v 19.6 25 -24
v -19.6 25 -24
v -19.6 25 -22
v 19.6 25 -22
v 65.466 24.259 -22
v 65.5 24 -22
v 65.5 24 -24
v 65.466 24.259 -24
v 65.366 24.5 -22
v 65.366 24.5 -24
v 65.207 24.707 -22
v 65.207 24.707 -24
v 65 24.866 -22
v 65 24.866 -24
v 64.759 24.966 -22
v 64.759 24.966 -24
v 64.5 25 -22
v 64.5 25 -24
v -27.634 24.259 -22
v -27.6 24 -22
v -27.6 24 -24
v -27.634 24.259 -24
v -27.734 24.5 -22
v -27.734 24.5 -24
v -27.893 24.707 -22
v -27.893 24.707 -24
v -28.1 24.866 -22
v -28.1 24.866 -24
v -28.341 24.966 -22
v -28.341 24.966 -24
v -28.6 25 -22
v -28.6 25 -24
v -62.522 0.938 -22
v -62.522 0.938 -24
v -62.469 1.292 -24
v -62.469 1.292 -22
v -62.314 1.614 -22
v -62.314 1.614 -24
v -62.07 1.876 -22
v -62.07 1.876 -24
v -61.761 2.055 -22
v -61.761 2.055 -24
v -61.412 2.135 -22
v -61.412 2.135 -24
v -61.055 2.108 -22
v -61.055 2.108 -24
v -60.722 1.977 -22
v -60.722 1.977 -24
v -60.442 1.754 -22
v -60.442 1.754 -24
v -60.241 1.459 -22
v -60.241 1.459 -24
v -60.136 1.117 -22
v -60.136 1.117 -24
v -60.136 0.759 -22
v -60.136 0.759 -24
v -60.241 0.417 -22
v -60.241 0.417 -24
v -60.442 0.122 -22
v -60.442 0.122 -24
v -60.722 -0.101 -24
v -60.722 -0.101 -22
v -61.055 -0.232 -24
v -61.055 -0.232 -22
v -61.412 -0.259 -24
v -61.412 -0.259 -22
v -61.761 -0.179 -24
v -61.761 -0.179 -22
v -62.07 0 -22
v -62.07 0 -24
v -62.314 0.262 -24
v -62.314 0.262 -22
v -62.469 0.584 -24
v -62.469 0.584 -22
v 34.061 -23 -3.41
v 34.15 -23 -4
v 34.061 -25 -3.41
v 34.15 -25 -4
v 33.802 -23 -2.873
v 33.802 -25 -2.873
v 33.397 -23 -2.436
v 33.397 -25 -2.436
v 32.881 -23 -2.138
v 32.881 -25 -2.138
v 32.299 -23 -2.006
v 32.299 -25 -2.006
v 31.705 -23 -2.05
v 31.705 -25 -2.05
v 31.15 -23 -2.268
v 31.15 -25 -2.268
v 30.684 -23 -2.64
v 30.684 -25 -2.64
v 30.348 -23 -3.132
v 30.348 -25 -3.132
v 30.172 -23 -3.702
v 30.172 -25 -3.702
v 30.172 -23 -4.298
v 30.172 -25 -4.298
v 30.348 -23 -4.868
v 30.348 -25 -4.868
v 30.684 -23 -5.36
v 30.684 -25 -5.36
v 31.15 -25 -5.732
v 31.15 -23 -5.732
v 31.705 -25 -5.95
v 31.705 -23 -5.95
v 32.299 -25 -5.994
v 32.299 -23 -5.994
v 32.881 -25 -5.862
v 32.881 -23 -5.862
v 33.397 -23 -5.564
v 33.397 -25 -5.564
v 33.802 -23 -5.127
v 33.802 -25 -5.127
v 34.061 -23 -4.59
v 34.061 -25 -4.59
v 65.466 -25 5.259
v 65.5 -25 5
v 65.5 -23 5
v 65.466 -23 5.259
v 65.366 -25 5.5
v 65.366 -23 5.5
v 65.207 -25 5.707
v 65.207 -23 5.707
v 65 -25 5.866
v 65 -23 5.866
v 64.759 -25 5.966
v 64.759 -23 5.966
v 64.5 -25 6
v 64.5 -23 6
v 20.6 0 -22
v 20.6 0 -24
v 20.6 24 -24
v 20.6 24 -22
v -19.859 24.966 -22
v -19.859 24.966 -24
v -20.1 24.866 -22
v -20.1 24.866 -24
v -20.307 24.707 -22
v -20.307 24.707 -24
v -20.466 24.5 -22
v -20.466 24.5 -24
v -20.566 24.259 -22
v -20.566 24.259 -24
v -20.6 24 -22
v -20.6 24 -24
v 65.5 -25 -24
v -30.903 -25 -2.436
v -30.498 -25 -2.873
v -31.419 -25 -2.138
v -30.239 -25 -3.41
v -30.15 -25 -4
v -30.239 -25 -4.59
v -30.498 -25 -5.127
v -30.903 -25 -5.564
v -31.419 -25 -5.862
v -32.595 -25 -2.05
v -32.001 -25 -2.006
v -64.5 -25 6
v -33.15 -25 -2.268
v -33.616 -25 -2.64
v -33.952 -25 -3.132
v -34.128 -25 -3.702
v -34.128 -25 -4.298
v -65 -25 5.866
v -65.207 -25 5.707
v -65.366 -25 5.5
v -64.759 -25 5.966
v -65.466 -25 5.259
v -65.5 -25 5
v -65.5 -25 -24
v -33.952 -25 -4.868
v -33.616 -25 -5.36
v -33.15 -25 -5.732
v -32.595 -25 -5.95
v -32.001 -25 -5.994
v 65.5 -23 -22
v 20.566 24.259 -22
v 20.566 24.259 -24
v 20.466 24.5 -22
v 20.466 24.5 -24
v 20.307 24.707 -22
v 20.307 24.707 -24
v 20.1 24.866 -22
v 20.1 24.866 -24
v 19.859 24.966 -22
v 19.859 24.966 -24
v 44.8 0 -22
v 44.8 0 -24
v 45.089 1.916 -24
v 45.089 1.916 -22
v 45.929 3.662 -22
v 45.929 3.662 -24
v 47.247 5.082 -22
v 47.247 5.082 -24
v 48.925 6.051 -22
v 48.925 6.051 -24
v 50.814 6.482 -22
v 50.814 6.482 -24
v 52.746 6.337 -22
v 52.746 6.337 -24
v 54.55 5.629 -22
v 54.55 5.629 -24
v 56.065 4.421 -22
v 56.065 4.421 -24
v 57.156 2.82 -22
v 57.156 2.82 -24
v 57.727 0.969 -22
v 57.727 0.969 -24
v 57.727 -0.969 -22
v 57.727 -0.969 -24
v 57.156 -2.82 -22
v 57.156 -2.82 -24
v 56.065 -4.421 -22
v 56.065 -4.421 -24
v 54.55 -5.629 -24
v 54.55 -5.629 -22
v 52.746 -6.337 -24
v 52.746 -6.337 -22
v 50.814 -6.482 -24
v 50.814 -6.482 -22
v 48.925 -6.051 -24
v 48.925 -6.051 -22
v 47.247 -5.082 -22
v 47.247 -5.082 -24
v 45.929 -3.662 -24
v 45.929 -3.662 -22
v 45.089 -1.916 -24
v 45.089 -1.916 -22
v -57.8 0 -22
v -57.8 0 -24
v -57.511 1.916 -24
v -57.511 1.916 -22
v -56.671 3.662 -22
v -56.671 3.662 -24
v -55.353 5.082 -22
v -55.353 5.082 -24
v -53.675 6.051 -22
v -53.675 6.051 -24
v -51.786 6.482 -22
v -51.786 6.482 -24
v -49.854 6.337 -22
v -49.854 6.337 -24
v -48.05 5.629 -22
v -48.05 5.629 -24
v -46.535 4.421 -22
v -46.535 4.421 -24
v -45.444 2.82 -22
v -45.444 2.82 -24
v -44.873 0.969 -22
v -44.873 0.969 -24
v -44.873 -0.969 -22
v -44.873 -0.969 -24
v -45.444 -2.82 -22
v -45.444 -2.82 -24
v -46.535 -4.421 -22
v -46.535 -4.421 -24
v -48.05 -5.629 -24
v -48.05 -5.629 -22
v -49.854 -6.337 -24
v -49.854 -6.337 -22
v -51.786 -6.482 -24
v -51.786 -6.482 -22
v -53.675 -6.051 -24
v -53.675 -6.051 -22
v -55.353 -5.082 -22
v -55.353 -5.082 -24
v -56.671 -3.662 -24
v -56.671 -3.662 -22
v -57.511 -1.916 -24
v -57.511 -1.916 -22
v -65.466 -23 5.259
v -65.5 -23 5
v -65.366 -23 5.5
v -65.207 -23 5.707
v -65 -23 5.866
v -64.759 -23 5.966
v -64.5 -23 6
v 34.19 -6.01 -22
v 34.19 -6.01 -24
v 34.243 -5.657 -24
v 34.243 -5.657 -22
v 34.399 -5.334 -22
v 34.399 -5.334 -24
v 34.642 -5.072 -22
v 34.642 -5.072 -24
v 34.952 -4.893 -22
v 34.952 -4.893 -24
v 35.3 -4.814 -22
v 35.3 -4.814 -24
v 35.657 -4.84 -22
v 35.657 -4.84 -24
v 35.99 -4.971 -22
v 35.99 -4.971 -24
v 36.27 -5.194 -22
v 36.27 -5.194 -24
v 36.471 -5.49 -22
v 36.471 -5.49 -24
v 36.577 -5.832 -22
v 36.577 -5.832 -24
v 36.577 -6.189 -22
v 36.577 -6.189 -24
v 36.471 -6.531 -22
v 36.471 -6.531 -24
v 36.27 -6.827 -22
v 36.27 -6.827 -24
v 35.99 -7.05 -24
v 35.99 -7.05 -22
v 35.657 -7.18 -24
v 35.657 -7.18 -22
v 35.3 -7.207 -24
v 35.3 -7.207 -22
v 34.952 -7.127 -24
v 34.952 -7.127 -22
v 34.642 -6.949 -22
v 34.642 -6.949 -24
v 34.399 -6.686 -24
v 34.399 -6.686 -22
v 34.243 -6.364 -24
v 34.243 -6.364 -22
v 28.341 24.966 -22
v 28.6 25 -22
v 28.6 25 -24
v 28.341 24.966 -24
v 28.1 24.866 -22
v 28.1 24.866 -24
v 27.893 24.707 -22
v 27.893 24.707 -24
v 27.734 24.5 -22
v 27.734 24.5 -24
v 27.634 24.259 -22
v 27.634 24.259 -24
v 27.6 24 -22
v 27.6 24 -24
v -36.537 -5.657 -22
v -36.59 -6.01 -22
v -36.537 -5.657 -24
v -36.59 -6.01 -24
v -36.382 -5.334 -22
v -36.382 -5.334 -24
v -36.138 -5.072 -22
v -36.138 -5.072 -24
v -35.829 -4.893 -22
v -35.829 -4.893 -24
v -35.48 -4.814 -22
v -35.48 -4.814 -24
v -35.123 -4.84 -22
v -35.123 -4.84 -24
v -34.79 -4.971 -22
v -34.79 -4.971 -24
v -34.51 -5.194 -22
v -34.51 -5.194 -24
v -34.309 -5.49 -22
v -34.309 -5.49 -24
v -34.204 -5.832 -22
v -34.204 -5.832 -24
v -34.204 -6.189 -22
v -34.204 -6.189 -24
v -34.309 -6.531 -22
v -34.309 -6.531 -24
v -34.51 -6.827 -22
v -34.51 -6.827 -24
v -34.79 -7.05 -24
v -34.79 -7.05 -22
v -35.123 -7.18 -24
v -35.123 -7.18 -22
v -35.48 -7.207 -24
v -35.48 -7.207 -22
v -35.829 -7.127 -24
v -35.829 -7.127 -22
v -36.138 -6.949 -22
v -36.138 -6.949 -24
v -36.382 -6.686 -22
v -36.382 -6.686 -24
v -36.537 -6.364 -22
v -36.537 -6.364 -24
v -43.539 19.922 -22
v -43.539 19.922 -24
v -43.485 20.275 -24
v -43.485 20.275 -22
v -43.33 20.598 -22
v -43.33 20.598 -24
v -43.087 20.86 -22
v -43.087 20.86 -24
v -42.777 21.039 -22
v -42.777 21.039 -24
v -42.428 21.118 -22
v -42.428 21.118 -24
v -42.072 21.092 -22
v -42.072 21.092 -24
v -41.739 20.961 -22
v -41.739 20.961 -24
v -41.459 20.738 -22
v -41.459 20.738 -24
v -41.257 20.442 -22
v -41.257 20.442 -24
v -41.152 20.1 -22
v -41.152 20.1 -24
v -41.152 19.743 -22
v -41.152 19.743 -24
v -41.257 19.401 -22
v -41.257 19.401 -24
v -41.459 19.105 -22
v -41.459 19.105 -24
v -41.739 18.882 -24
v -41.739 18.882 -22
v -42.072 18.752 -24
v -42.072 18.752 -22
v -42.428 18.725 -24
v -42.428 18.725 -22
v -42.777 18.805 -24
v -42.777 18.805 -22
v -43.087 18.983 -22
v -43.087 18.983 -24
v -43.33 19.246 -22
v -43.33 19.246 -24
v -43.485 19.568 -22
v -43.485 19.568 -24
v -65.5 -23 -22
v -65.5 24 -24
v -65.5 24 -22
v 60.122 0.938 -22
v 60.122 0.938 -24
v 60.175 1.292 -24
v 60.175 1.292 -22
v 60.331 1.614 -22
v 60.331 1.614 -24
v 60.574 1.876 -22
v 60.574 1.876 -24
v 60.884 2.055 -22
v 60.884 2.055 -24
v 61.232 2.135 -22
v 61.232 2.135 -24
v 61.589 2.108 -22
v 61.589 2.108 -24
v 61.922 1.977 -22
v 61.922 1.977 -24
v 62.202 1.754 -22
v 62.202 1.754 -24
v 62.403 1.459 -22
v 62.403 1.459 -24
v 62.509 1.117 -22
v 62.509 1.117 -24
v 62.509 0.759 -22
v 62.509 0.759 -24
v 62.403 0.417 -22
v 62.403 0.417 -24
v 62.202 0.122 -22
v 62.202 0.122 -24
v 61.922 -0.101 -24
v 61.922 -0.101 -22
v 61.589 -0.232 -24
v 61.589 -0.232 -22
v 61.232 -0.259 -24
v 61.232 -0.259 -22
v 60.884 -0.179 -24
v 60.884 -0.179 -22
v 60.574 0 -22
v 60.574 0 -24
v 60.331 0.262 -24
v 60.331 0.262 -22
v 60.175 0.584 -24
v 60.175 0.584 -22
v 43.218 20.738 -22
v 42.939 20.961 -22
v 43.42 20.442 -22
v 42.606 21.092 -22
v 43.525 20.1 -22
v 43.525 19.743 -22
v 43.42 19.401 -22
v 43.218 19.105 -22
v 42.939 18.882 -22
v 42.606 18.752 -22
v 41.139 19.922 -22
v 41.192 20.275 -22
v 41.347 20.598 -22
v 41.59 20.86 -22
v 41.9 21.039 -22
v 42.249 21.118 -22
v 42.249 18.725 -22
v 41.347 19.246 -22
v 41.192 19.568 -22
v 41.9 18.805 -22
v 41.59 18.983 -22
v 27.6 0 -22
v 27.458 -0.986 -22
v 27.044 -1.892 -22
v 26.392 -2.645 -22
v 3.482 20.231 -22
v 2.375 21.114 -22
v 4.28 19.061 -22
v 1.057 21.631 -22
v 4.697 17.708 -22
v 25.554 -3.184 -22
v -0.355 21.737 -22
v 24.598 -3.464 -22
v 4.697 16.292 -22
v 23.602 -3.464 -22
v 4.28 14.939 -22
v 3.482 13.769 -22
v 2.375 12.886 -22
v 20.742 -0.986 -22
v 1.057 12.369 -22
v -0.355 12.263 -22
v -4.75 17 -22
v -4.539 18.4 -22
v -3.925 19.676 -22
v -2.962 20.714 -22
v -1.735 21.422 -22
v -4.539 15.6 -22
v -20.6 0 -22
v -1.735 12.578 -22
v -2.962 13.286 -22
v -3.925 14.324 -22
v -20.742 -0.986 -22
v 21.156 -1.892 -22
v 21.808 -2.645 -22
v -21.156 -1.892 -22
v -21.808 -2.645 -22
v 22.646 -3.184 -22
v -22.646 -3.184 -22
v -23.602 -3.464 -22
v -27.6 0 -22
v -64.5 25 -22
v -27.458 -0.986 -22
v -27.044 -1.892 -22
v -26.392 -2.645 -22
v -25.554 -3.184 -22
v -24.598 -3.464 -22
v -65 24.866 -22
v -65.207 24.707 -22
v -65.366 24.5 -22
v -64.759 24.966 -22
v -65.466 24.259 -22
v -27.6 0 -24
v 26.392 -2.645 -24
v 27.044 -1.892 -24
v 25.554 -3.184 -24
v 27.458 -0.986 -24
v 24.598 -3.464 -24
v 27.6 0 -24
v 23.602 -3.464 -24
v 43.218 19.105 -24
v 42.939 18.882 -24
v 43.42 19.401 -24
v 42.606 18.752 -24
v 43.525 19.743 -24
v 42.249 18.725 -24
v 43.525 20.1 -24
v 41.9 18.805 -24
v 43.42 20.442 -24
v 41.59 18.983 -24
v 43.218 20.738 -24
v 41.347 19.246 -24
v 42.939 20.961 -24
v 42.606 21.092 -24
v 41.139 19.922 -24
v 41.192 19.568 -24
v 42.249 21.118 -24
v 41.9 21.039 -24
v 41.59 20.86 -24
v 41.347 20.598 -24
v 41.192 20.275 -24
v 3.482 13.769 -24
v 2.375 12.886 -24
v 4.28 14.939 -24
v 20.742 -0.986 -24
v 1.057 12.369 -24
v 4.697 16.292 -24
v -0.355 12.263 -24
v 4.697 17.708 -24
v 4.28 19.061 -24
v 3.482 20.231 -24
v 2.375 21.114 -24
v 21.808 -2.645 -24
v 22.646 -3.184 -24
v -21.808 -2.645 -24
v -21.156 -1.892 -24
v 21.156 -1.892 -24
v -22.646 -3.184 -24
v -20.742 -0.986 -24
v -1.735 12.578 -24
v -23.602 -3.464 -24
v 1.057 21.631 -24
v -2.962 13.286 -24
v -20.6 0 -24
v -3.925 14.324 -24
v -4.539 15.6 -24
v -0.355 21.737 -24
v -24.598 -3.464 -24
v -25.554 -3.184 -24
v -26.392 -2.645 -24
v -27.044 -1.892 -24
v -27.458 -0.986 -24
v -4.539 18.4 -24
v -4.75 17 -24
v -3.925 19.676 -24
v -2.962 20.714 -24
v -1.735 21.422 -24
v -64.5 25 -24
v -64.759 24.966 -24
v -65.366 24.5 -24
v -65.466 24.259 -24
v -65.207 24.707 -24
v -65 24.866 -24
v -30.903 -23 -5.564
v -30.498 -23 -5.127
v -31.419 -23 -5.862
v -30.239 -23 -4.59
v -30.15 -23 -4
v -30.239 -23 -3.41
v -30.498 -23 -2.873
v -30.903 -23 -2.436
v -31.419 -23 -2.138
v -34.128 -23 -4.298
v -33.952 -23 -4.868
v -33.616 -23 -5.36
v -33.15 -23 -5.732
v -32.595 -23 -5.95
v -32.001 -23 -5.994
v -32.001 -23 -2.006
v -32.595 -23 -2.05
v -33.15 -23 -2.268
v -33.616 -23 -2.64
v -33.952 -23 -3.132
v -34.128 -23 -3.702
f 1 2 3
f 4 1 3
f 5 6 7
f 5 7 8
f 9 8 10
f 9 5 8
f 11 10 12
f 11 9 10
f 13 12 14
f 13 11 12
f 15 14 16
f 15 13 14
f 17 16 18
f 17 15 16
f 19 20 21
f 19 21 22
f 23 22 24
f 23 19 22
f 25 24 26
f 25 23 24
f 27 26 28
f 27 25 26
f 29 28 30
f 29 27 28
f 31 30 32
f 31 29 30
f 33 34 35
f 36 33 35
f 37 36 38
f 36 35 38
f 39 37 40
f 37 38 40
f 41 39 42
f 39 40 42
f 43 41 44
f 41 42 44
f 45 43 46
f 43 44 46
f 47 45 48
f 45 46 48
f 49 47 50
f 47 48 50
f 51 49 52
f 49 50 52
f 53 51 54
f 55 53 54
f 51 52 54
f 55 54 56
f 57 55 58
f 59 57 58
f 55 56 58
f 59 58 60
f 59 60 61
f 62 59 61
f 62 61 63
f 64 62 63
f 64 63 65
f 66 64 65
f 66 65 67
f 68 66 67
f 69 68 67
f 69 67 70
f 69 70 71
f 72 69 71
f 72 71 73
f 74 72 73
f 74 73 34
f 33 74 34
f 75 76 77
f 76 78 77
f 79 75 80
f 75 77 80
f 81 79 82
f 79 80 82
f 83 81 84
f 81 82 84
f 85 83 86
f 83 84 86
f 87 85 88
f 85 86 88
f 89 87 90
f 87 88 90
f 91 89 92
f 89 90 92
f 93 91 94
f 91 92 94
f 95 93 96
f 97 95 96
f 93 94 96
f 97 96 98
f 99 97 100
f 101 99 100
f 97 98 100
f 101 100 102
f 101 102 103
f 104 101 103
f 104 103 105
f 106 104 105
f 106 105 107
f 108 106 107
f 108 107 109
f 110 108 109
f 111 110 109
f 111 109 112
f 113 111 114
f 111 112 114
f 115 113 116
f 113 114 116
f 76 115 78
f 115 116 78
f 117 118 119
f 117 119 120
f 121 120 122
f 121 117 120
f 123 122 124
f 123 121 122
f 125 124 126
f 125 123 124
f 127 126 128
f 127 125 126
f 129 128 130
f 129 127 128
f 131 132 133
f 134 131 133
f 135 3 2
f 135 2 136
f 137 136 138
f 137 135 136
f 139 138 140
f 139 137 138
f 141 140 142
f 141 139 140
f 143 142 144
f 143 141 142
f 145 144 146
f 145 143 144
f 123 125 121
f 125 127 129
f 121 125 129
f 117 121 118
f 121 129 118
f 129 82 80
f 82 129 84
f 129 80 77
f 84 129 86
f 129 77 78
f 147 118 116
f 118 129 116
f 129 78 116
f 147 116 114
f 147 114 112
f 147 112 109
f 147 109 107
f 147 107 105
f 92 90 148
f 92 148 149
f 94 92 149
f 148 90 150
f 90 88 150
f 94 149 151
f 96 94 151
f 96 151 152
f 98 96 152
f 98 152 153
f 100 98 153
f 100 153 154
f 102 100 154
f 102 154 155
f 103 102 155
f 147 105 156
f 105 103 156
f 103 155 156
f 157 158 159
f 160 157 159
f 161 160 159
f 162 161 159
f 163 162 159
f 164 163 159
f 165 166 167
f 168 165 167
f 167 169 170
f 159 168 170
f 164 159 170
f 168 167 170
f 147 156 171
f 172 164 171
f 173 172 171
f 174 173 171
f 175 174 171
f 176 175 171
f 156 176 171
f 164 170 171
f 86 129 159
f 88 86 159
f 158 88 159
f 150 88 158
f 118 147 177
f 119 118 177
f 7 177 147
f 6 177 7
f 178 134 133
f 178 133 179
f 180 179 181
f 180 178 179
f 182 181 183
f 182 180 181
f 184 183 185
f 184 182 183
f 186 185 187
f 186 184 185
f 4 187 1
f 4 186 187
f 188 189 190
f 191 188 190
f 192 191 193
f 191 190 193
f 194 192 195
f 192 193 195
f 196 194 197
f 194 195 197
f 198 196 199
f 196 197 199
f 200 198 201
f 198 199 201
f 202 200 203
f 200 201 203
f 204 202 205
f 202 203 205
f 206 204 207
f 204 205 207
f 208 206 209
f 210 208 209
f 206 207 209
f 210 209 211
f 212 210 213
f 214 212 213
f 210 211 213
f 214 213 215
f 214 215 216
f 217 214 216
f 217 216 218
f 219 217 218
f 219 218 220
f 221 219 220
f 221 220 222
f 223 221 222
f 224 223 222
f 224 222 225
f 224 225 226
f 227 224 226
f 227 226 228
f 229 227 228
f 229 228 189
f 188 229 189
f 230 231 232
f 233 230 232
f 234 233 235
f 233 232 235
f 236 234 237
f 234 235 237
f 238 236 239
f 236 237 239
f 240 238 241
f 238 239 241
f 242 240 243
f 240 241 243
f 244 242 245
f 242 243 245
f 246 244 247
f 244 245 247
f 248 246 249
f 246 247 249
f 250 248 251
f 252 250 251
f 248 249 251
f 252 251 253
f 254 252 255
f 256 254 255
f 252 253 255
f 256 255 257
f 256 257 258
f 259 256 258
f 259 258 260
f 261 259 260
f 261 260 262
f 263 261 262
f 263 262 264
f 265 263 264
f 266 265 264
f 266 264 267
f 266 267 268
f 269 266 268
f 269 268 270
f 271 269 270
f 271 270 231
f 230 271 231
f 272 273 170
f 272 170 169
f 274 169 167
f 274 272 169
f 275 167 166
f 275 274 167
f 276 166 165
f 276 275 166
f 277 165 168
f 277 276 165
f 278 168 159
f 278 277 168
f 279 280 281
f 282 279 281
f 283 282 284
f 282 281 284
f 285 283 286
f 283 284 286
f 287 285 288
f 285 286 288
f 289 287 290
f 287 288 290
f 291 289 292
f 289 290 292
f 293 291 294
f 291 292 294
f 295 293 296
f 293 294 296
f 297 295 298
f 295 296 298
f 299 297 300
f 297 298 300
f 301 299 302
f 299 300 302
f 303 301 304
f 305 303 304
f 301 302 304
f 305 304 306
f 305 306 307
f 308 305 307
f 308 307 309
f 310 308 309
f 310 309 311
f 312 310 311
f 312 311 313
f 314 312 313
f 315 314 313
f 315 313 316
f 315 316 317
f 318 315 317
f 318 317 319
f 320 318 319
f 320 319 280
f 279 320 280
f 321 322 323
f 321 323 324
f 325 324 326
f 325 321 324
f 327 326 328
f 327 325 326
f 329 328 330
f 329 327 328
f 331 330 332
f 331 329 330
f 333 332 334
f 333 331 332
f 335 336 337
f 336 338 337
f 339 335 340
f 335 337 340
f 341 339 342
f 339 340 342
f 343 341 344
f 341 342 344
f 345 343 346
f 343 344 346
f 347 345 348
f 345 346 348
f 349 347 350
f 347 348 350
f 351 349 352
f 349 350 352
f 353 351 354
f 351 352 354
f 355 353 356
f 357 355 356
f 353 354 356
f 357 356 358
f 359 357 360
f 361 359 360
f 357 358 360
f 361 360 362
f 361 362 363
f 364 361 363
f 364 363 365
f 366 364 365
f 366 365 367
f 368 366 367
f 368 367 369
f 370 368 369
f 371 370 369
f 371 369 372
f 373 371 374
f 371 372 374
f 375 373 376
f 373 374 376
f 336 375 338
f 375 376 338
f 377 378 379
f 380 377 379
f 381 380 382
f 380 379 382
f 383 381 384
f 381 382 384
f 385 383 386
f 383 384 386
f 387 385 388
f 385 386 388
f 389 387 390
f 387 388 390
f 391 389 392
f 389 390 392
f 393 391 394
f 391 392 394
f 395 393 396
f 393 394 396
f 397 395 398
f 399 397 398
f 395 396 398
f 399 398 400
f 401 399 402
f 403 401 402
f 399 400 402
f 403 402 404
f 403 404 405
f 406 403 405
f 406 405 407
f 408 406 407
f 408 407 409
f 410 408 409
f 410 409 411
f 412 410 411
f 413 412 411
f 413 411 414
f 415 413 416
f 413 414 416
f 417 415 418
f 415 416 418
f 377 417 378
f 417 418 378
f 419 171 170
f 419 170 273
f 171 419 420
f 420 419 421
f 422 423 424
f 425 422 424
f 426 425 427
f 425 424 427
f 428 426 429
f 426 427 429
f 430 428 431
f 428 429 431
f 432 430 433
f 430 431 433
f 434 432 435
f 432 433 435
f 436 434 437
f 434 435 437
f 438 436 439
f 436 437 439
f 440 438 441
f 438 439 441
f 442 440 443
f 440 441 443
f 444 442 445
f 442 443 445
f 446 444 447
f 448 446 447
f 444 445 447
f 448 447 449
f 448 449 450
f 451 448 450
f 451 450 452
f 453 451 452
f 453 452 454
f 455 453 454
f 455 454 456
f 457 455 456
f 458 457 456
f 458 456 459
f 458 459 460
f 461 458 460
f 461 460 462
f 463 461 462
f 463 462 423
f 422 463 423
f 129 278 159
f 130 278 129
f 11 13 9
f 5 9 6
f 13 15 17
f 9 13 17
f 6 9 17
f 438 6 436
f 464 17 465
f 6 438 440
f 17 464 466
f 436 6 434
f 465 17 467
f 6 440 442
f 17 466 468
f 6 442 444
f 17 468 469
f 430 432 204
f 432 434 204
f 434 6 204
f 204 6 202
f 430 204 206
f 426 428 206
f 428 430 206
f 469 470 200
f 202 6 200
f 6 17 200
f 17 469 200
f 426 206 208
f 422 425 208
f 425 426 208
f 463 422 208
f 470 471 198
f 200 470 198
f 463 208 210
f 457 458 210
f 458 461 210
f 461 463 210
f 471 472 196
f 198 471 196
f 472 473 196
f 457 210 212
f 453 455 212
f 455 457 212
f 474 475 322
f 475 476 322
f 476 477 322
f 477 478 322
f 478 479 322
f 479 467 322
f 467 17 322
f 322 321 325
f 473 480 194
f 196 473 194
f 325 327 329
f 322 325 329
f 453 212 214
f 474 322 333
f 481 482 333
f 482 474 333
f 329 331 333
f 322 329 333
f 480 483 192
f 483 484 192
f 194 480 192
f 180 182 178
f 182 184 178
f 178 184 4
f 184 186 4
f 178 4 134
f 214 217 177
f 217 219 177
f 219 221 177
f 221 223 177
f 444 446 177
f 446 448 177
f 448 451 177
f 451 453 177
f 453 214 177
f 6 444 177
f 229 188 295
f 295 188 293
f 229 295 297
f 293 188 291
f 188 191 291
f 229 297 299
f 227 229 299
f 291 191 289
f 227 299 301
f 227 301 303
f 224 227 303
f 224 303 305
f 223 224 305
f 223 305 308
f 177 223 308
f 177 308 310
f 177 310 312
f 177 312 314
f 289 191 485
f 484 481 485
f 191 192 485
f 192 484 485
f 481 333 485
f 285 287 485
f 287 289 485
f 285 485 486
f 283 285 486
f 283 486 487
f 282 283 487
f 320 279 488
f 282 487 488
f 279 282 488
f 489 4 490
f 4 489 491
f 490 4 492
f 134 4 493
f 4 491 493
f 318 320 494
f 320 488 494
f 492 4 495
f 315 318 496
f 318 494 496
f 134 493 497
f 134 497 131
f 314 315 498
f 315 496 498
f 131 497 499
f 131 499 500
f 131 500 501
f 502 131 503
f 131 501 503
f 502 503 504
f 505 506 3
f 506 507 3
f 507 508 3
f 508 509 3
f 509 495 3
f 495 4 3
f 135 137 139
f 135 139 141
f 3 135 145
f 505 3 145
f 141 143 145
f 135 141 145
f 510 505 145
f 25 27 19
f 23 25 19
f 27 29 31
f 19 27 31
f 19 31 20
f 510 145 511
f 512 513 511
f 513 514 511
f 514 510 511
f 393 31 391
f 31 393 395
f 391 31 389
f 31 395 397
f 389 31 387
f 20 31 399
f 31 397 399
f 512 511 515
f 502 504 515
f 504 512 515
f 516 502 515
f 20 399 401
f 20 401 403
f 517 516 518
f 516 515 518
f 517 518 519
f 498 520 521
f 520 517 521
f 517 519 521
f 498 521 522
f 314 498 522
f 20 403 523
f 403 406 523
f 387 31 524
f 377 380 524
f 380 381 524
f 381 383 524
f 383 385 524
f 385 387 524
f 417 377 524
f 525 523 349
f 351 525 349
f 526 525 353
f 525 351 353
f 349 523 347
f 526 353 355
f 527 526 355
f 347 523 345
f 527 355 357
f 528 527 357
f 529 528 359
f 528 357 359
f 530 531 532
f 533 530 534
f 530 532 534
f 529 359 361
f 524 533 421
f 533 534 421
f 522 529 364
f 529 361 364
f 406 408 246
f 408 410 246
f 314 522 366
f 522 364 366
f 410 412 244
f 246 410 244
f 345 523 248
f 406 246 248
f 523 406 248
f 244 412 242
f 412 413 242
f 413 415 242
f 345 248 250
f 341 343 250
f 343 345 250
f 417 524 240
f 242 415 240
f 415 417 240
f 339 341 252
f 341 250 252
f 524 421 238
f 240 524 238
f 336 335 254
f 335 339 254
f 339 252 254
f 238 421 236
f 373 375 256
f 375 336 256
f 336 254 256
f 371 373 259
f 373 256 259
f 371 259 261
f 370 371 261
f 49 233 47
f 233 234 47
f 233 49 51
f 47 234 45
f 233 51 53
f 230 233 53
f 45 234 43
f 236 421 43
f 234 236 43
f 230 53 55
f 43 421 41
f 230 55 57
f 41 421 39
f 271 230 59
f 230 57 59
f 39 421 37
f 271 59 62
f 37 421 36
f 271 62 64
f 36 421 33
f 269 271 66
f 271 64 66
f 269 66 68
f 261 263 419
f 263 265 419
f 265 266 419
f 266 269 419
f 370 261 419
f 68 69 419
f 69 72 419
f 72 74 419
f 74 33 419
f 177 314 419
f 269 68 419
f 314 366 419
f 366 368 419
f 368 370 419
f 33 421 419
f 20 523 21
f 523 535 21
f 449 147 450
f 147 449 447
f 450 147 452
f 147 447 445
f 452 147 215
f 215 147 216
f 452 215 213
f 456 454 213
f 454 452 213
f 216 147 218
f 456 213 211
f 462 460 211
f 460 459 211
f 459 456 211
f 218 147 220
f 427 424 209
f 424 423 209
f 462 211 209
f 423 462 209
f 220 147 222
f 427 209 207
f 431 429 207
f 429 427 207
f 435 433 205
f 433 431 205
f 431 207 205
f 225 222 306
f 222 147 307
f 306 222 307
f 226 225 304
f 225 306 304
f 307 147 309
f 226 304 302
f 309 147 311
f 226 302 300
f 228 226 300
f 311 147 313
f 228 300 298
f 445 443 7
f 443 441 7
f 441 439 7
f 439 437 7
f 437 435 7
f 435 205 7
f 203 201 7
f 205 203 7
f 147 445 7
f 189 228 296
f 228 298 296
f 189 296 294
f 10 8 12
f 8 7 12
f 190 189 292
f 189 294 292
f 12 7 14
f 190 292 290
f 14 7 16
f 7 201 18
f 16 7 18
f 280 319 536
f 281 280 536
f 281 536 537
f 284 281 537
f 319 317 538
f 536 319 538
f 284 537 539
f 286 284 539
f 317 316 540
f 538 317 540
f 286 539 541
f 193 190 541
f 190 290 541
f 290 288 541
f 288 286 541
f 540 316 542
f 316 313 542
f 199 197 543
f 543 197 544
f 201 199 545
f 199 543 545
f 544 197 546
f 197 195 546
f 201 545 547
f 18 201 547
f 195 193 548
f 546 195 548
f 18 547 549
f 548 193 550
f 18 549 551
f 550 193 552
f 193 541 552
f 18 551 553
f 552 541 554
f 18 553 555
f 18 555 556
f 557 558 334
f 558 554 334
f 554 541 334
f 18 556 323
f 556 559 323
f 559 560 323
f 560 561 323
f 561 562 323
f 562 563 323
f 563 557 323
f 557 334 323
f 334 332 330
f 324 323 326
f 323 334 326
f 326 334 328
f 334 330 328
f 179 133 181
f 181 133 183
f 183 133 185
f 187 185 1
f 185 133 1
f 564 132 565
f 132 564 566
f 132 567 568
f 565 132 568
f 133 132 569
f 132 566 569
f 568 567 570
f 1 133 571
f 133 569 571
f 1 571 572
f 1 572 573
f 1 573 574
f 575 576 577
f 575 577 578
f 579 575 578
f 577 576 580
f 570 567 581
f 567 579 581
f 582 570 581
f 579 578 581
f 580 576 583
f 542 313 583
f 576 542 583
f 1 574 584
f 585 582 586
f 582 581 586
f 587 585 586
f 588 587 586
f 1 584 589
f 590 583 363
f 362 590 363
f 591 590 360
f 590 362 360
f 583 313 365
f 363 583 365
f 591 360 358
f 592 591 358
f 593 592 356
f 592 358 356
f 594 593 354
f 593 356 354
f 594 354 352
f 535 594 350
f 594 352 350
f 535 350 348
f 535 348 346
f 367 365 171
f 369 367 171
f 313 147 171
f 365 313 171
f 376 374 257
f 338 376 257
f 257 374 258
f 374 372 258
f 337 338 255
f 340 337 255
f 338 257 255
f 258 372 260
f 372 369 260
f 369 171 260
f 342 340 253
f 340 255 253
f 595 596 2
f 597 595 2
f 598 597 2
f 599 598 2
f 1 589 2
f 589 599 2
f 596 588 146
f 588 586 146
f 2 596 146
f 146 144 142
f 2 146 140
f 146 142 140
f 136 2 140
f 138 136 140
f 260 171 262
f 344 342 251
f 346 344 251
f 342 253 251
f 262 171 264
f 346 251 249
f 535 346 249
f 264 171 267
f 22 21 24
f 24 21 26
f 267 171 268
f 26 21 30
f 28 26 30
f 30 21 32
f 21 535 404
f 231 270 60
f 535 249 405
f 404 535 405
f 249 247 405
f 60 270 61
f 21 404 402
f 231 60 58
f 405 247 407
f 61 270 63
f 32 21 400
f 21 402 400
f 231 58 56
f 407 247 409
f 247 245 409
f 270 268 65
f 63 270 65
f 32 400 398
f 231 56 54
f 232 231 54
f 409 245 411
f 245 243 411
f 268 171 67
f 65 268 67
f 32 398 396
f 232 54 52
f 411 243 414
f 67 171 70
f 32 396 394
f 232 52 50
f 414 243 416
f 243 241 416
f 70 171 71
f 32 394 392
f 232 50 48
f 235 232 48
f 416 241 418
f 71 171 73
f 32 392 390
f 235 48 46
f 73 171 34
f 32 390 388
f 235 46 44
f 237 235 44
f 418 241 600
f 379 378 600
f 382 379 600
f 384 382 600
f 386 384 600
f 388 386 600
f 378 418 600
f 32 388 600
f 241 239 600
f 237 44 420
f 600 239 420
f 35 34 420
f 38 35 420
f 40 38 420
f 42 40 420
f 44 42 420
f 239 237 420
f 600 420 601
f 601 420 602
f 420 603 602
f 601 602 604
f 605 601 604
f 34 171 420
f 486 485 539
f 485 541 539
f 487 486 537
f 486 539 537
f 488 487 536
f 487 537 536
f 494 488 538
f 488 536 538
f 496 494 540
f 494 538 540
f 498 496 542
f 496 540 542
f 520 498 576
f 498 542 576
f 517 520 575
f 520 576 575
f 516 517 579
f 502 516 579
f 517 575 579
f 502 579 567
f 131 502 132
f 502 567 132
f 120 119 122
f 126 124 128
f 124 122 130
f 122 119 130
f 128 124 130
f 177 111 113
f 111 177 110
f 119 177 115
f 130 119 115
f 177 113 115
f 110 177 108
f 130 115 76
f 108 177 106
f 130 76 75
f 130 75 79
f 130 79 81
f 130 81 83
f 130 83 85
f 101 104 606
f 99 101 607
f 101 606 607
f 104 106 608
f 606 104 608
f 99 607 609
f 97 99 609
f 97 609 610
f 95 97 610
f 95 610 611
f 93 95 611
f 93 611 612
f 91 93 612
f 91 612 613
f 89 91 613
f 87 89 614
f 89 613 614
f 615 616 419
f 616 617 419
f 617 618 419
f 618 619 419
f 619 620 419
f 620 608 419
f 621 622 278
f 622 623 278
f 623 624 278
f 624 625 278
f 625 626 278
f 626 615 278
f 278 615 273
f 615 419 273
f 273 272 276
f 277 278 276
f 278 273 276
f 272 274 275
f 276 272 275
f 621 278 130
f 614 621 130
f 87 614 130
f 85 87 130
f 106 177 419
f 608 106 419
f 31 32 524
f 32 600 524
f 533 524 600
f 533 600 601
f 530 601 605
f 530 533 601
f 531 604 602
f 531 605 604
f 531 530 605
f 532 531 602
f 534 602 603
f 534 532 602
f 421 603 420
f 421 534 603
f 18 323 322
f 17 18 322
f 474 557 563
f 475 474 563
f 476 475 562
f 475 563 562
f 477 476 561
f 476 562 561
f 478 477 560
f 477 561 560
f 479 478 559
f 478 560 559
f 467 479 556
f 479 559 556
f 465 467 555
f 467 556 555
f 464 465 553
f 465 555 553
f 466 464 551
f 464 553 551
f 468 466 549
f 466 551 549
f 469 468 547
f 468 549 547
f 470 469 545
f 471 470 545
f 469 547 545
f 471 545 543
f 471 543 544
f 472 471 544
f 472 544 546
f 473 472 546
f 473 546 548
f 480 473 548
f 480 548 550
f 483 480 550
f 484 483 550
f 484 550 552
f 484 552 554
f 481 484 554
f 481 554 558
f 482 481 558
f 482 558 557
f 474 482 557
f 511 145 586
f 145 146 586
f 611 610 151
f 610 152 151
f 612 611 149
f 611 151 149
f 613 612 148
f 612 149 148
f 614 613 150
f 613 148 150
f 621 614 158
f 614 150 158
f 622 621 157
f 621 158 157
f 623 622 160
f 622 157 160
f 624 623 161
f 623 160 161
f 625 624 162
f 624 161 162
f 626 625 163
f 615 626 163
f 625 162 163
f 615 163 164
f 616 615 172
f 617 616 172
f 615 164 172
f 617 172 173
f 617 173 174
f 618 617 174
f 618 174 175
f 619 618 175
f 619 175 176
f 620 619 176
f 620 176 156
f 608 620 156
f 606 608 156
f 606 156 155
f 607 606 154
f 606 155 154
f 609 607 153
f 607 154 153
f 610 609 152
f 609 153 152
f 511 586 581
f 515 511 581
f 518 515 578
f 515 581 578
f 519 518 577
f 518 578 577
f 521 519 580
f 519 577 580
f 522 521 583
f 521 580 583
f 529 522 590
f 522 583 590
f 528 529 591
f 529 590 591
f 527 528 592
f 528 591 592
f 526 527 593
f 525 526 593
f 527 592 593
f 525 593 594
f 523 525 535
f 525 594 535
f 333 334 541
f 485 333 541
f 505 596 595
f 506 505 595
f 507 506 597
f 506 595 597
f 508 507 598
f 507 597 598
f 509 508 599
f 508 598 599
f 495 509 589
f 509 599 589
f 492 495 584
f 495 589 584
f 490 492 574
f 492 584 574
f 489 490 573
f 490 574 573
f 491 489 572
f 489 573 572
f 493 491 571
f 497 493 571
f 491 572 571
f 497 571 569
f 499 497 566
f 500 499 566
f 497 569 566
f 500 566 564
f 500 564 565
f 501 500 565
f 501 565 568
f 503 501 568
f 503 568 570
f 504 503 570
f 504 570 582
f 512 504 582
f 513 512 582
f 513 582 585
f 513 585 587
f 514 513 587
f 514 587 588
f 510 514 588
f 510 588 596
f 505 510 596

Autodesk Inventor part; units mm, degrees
ref_plane "YZ Plane" through (0, 0, 0) normal (1, 0, 0) x (0, 1, 0)
ref_plane "XZ Plane" through (0, 0, 0) normal (0, 1, 0) x (-1, 0, 0)
ref_plane "XY Plane" through (0, 0, 0) normal (0, 0, 1) x (1, 0, 0)
sketch "Sketch1" plane through (0, 0, 0) normal (1, 0, 0) x (0, 1, 0)
  line L0 (-25, 24) -> (-25, -24)
  line L1 (-25, -24) -> (25, -24)
  line L2 (25, -24) -> (25, -22)
  line L3 (25, -22) -> (-23, -22)
  line L4 (-23, -22) -> (-23, 24)
  line L5 (-23, 24) -> (-25, 24)
extrude "Extrusion1" add sketch "Sketch1" along normal mid plane 131
sketch "Sketch2" plane through (65.5, 25, -24) normal (0, 0, -1) x (-1, 0, 0)
  circle A0 centre (41.4, -25) radius 3.5
  circle A1 centre (89.6, -25) radius 3.5
  line L0 (131, 0) -> (0, 0) projected
  line L1 (37.9, -25) -> (44.9, -25)
  line L2 (44.9, -25) -> (44.9, 0)
  line L3 (44.9, 0) -> (37.9, 0)
  line L4 (37.9, 0) -> (37.9, -25)
  line L5 (86.1, -25) -> (93.1, -25)
  line L6 (93.1, -25) -> (93.1, 0)
  line L7 (93.1, 0) -> (86.1, 0)
  line L8 (86.1, 0) -> (86.1, -25)
  line L9 (65.5, 0) -> (65.5, -8)
  circle A2 centre (65.5, -8) radius 4.75
  dimension "d17" = 7
  dimension "d18" = 7
  dimension "d129" = 8
  dimension "d130" = 9.5
hole "Hole1" at (24.1, 0, -24) at (-24.1, 0, -24) direction (0, 0, 1) diameter 7 depth 2
sketch "Sketch3" plane through (65.5, 25, -24) normal (0, 0, -1) x (-1, 0, 0)
  line L0 (65.5, -25) -> (14.2, -25)
  line L1 (65.5, -25) -> (116.8, -25)
  circle A0 centre (14.2, -25) radius 9.5
  circle A1 centre (14.2, -25) radius 1.75
  circle A2 centre (116.8, -25) radius 1.75
  dimension "d26" = 51.3
  dimension "d27" = 51.3
  dimension "d28" = 19
  dimension "d29" = 3.5
  dimension "d30" = 3.5
hole "Hole2" at (51.3, 0, -24) at (-51.3, 0, -24) direction (0, 0, 1) diameter 3.5 depth 2
sketch "Sketch7" plane through (65.5, 25, -24) normal (0, 0, -1) x (-1, 0, 0)
  circle A0 centre (14.2, -25) radius 1.75 projected
  circle A1 centre (14.2, -25) radius 3.5
  point P0 (65.5, -25)
  dimension "d89" = 7
extrude "Extrusion3" cut sketch "Sketch7" against normal blind 2
sketch "Sketch8" plane through (65.5, 25, -24) normal (0, 0, -1) x (-1, 0, 0)
  circle A0 centre (14.2, -25) radius 3.5 projected
  line L0 (14.2, -25) -> (39.2, -25) construction
  circle A1 centre (19.1497, -20.0503) radius 18.4
  circle A2 centre (19.1497, -20.0503) radius 15.5
  line L1 (14.2, -25) -> (19.1497, -20.0503)
  line L2 (19.1497, -20.0503) -> (36.8274, -2.3726)
  line L3 (36.8274, -2.3726) -> (1.4721, -37.7279)
  line L4 (6.139, -7.0395) -> (32.1605, -33.061)
  circle A3 centre (8.1896, -9.0901) radius 1.2
  circle A4 centre (30.1099, -31.0104) radius 1.2
  circle A5 centre (23.1614, -5.0784) radius 1.2
  circle A6 centre (4.1779, -24.0619) radius 1.2
  circle A7 centre (15.1381, -35.0221) radius 1.2
  circle A8 centre (34.1216, -16.0386) radius 1.2
  point P0 (65.5, -25)
  dimension "d96" = 31
  dimension "d97" = 25
  dimension "d98" = 180
  dimension "d99" = 50
  dimension "d100" = 2.4
  dimension "d101" = 2.4
  dimension "d104" = 2.4
  dimension "d105" = 2.4
  dimension "d106" = 2.4
  dimension "d107" = 2.4
extrude "Extrusion4" cut sketch "Sketch8" against normal blind 2 contours A3 A2 L4 | L4 A2 A3 | A4 A2 L4 | L4 A2 A4 | A6 A2 | A2 A6 | A7 A2 | A2 A7 | A8 A2 | A2 A8 | A5 A2 | A2 A5 | L4 A3 A2 | A2 A3 L4 | L4 A4 A2 | A2 A4 L4
sketch "Sketch9" plane through (65.5, 25, -24) normal (0, 0, -1) x (-1, 0, 0)
  circle A0 centre (34.1216, -16.0386) radius 1.2 projected
  circle A1 centre (8.1896, -9.0901) radius 1.2 projected
  circle A2 centre (15.1381, -35.0221) radius 1.2 projected
  point P0 (65.5, -25)
extrude "Extrusion6" add sketch "Sketch9" against normal blind 2
sketch "Sketch11" plane through (65.5, 25, -24) normal (0, 0, -1) x (-1, 0, 0)
  circle A0 centre (4.1779, -24.0619) radius 1.2 projected
  circle A1 centre (30.1099, -31.0104) radius 1.2 projected
  circle A2 centre (23.1614, -5.0784) radius 1.2 projected
  circle A3 centre (14.2, -25) radius 3.5 projected
  circle A4 centre (116.8, -25) radius 1.75 projected
  line L0 (65.5, -25) -> (65.5, 0)
  line L1 (0, 0) -> (131, 0) projected
  circle A5 centre (126.8221, -24.0619) radius 1.2
  circle A6 centre (100.8901, -31.0104) radius 1.2
  circle A7 centre (107.8386, -5.0784) radius 1.2
  circle A8 centre (116.8, -25) radius 3.5
extrude "Extrusion7" cut sketch "Sketch11" against normal blind 2 contours A5 | A6 | A7 | A8
sketch "Sketch12" plane through (65.5, 25, -24) normal (0, 0, -1) x (-1, 0, 0)
  circle A0 centre (116.8, -25) radius 3.5 projected
  circle A1 centre (14.2, -25) radius 3.5 projected
  circle A2 centre (14.2, -25) radius 6.5
  circle A3 centre (116.8, -25) radius 6.5
  point P0 (65.5, -25)
  dimension "d116" = 13
  dimension "d117" = 13
extrude "Extrusion8" cut sketch "Sketch12" against normal blind 2
extrude "Extrusion9" cut sketch "Sketch2" against normal blind 2 contours L1 A0 | L0 L6 A1 L8 | A0 L1 | A0 L4 L0 L2 | L5 A1 | A1 L5
fillet "Fillet1" radius 1 4 edges at (20.6, 25, -23) (27.6, 25, -23) (-20.6, 25, -23) (-27.6, 25, -23)
fillet "Fillet2" radius 1 2 edges at (65.5, 25, -23) (-65.5, 25, -23)
extrude "Extrusion10" cut sketch "Sketch2" against normal blind 2 contours A2
sketch "Sketch14" plane through (-65.5, -25, 24) normal (0, 0, 1) x (1, 0, 0)
  line L0 (0, 2) -> (131, 2)
  line L1 (131, 2) -> (131, 0)
  line L2 (131, 0) -> (0, 0)
  line L3 (0, 0) -> (0, 2)
  point P0 (65.5, 25)
extrude "Extrusion11" cut sketch "Sketch14" against normal blind 18
fillet "Fillet3" radius 1 2 edges at (-65.5, -24, 6) (65.5, -24, 6)
sketch "Sketch15" plane through (-65.5, -25, -24) normal (0, -1, 0) x (1, 0, 0)
  circle A0 centre (97.65, 20) radius 2
  circle A1 centre (33.35, 20) radius 2
  point P0 (65.5, 24)
  point P1 (131, 0)
  point P2 (0, 0)
  dimension "d139" = 4
  dimension "d140" = 4
extrude "Extrusion12" cut sketch "Sketch15" against normal blind 2
properties part number "drzak_motory"
